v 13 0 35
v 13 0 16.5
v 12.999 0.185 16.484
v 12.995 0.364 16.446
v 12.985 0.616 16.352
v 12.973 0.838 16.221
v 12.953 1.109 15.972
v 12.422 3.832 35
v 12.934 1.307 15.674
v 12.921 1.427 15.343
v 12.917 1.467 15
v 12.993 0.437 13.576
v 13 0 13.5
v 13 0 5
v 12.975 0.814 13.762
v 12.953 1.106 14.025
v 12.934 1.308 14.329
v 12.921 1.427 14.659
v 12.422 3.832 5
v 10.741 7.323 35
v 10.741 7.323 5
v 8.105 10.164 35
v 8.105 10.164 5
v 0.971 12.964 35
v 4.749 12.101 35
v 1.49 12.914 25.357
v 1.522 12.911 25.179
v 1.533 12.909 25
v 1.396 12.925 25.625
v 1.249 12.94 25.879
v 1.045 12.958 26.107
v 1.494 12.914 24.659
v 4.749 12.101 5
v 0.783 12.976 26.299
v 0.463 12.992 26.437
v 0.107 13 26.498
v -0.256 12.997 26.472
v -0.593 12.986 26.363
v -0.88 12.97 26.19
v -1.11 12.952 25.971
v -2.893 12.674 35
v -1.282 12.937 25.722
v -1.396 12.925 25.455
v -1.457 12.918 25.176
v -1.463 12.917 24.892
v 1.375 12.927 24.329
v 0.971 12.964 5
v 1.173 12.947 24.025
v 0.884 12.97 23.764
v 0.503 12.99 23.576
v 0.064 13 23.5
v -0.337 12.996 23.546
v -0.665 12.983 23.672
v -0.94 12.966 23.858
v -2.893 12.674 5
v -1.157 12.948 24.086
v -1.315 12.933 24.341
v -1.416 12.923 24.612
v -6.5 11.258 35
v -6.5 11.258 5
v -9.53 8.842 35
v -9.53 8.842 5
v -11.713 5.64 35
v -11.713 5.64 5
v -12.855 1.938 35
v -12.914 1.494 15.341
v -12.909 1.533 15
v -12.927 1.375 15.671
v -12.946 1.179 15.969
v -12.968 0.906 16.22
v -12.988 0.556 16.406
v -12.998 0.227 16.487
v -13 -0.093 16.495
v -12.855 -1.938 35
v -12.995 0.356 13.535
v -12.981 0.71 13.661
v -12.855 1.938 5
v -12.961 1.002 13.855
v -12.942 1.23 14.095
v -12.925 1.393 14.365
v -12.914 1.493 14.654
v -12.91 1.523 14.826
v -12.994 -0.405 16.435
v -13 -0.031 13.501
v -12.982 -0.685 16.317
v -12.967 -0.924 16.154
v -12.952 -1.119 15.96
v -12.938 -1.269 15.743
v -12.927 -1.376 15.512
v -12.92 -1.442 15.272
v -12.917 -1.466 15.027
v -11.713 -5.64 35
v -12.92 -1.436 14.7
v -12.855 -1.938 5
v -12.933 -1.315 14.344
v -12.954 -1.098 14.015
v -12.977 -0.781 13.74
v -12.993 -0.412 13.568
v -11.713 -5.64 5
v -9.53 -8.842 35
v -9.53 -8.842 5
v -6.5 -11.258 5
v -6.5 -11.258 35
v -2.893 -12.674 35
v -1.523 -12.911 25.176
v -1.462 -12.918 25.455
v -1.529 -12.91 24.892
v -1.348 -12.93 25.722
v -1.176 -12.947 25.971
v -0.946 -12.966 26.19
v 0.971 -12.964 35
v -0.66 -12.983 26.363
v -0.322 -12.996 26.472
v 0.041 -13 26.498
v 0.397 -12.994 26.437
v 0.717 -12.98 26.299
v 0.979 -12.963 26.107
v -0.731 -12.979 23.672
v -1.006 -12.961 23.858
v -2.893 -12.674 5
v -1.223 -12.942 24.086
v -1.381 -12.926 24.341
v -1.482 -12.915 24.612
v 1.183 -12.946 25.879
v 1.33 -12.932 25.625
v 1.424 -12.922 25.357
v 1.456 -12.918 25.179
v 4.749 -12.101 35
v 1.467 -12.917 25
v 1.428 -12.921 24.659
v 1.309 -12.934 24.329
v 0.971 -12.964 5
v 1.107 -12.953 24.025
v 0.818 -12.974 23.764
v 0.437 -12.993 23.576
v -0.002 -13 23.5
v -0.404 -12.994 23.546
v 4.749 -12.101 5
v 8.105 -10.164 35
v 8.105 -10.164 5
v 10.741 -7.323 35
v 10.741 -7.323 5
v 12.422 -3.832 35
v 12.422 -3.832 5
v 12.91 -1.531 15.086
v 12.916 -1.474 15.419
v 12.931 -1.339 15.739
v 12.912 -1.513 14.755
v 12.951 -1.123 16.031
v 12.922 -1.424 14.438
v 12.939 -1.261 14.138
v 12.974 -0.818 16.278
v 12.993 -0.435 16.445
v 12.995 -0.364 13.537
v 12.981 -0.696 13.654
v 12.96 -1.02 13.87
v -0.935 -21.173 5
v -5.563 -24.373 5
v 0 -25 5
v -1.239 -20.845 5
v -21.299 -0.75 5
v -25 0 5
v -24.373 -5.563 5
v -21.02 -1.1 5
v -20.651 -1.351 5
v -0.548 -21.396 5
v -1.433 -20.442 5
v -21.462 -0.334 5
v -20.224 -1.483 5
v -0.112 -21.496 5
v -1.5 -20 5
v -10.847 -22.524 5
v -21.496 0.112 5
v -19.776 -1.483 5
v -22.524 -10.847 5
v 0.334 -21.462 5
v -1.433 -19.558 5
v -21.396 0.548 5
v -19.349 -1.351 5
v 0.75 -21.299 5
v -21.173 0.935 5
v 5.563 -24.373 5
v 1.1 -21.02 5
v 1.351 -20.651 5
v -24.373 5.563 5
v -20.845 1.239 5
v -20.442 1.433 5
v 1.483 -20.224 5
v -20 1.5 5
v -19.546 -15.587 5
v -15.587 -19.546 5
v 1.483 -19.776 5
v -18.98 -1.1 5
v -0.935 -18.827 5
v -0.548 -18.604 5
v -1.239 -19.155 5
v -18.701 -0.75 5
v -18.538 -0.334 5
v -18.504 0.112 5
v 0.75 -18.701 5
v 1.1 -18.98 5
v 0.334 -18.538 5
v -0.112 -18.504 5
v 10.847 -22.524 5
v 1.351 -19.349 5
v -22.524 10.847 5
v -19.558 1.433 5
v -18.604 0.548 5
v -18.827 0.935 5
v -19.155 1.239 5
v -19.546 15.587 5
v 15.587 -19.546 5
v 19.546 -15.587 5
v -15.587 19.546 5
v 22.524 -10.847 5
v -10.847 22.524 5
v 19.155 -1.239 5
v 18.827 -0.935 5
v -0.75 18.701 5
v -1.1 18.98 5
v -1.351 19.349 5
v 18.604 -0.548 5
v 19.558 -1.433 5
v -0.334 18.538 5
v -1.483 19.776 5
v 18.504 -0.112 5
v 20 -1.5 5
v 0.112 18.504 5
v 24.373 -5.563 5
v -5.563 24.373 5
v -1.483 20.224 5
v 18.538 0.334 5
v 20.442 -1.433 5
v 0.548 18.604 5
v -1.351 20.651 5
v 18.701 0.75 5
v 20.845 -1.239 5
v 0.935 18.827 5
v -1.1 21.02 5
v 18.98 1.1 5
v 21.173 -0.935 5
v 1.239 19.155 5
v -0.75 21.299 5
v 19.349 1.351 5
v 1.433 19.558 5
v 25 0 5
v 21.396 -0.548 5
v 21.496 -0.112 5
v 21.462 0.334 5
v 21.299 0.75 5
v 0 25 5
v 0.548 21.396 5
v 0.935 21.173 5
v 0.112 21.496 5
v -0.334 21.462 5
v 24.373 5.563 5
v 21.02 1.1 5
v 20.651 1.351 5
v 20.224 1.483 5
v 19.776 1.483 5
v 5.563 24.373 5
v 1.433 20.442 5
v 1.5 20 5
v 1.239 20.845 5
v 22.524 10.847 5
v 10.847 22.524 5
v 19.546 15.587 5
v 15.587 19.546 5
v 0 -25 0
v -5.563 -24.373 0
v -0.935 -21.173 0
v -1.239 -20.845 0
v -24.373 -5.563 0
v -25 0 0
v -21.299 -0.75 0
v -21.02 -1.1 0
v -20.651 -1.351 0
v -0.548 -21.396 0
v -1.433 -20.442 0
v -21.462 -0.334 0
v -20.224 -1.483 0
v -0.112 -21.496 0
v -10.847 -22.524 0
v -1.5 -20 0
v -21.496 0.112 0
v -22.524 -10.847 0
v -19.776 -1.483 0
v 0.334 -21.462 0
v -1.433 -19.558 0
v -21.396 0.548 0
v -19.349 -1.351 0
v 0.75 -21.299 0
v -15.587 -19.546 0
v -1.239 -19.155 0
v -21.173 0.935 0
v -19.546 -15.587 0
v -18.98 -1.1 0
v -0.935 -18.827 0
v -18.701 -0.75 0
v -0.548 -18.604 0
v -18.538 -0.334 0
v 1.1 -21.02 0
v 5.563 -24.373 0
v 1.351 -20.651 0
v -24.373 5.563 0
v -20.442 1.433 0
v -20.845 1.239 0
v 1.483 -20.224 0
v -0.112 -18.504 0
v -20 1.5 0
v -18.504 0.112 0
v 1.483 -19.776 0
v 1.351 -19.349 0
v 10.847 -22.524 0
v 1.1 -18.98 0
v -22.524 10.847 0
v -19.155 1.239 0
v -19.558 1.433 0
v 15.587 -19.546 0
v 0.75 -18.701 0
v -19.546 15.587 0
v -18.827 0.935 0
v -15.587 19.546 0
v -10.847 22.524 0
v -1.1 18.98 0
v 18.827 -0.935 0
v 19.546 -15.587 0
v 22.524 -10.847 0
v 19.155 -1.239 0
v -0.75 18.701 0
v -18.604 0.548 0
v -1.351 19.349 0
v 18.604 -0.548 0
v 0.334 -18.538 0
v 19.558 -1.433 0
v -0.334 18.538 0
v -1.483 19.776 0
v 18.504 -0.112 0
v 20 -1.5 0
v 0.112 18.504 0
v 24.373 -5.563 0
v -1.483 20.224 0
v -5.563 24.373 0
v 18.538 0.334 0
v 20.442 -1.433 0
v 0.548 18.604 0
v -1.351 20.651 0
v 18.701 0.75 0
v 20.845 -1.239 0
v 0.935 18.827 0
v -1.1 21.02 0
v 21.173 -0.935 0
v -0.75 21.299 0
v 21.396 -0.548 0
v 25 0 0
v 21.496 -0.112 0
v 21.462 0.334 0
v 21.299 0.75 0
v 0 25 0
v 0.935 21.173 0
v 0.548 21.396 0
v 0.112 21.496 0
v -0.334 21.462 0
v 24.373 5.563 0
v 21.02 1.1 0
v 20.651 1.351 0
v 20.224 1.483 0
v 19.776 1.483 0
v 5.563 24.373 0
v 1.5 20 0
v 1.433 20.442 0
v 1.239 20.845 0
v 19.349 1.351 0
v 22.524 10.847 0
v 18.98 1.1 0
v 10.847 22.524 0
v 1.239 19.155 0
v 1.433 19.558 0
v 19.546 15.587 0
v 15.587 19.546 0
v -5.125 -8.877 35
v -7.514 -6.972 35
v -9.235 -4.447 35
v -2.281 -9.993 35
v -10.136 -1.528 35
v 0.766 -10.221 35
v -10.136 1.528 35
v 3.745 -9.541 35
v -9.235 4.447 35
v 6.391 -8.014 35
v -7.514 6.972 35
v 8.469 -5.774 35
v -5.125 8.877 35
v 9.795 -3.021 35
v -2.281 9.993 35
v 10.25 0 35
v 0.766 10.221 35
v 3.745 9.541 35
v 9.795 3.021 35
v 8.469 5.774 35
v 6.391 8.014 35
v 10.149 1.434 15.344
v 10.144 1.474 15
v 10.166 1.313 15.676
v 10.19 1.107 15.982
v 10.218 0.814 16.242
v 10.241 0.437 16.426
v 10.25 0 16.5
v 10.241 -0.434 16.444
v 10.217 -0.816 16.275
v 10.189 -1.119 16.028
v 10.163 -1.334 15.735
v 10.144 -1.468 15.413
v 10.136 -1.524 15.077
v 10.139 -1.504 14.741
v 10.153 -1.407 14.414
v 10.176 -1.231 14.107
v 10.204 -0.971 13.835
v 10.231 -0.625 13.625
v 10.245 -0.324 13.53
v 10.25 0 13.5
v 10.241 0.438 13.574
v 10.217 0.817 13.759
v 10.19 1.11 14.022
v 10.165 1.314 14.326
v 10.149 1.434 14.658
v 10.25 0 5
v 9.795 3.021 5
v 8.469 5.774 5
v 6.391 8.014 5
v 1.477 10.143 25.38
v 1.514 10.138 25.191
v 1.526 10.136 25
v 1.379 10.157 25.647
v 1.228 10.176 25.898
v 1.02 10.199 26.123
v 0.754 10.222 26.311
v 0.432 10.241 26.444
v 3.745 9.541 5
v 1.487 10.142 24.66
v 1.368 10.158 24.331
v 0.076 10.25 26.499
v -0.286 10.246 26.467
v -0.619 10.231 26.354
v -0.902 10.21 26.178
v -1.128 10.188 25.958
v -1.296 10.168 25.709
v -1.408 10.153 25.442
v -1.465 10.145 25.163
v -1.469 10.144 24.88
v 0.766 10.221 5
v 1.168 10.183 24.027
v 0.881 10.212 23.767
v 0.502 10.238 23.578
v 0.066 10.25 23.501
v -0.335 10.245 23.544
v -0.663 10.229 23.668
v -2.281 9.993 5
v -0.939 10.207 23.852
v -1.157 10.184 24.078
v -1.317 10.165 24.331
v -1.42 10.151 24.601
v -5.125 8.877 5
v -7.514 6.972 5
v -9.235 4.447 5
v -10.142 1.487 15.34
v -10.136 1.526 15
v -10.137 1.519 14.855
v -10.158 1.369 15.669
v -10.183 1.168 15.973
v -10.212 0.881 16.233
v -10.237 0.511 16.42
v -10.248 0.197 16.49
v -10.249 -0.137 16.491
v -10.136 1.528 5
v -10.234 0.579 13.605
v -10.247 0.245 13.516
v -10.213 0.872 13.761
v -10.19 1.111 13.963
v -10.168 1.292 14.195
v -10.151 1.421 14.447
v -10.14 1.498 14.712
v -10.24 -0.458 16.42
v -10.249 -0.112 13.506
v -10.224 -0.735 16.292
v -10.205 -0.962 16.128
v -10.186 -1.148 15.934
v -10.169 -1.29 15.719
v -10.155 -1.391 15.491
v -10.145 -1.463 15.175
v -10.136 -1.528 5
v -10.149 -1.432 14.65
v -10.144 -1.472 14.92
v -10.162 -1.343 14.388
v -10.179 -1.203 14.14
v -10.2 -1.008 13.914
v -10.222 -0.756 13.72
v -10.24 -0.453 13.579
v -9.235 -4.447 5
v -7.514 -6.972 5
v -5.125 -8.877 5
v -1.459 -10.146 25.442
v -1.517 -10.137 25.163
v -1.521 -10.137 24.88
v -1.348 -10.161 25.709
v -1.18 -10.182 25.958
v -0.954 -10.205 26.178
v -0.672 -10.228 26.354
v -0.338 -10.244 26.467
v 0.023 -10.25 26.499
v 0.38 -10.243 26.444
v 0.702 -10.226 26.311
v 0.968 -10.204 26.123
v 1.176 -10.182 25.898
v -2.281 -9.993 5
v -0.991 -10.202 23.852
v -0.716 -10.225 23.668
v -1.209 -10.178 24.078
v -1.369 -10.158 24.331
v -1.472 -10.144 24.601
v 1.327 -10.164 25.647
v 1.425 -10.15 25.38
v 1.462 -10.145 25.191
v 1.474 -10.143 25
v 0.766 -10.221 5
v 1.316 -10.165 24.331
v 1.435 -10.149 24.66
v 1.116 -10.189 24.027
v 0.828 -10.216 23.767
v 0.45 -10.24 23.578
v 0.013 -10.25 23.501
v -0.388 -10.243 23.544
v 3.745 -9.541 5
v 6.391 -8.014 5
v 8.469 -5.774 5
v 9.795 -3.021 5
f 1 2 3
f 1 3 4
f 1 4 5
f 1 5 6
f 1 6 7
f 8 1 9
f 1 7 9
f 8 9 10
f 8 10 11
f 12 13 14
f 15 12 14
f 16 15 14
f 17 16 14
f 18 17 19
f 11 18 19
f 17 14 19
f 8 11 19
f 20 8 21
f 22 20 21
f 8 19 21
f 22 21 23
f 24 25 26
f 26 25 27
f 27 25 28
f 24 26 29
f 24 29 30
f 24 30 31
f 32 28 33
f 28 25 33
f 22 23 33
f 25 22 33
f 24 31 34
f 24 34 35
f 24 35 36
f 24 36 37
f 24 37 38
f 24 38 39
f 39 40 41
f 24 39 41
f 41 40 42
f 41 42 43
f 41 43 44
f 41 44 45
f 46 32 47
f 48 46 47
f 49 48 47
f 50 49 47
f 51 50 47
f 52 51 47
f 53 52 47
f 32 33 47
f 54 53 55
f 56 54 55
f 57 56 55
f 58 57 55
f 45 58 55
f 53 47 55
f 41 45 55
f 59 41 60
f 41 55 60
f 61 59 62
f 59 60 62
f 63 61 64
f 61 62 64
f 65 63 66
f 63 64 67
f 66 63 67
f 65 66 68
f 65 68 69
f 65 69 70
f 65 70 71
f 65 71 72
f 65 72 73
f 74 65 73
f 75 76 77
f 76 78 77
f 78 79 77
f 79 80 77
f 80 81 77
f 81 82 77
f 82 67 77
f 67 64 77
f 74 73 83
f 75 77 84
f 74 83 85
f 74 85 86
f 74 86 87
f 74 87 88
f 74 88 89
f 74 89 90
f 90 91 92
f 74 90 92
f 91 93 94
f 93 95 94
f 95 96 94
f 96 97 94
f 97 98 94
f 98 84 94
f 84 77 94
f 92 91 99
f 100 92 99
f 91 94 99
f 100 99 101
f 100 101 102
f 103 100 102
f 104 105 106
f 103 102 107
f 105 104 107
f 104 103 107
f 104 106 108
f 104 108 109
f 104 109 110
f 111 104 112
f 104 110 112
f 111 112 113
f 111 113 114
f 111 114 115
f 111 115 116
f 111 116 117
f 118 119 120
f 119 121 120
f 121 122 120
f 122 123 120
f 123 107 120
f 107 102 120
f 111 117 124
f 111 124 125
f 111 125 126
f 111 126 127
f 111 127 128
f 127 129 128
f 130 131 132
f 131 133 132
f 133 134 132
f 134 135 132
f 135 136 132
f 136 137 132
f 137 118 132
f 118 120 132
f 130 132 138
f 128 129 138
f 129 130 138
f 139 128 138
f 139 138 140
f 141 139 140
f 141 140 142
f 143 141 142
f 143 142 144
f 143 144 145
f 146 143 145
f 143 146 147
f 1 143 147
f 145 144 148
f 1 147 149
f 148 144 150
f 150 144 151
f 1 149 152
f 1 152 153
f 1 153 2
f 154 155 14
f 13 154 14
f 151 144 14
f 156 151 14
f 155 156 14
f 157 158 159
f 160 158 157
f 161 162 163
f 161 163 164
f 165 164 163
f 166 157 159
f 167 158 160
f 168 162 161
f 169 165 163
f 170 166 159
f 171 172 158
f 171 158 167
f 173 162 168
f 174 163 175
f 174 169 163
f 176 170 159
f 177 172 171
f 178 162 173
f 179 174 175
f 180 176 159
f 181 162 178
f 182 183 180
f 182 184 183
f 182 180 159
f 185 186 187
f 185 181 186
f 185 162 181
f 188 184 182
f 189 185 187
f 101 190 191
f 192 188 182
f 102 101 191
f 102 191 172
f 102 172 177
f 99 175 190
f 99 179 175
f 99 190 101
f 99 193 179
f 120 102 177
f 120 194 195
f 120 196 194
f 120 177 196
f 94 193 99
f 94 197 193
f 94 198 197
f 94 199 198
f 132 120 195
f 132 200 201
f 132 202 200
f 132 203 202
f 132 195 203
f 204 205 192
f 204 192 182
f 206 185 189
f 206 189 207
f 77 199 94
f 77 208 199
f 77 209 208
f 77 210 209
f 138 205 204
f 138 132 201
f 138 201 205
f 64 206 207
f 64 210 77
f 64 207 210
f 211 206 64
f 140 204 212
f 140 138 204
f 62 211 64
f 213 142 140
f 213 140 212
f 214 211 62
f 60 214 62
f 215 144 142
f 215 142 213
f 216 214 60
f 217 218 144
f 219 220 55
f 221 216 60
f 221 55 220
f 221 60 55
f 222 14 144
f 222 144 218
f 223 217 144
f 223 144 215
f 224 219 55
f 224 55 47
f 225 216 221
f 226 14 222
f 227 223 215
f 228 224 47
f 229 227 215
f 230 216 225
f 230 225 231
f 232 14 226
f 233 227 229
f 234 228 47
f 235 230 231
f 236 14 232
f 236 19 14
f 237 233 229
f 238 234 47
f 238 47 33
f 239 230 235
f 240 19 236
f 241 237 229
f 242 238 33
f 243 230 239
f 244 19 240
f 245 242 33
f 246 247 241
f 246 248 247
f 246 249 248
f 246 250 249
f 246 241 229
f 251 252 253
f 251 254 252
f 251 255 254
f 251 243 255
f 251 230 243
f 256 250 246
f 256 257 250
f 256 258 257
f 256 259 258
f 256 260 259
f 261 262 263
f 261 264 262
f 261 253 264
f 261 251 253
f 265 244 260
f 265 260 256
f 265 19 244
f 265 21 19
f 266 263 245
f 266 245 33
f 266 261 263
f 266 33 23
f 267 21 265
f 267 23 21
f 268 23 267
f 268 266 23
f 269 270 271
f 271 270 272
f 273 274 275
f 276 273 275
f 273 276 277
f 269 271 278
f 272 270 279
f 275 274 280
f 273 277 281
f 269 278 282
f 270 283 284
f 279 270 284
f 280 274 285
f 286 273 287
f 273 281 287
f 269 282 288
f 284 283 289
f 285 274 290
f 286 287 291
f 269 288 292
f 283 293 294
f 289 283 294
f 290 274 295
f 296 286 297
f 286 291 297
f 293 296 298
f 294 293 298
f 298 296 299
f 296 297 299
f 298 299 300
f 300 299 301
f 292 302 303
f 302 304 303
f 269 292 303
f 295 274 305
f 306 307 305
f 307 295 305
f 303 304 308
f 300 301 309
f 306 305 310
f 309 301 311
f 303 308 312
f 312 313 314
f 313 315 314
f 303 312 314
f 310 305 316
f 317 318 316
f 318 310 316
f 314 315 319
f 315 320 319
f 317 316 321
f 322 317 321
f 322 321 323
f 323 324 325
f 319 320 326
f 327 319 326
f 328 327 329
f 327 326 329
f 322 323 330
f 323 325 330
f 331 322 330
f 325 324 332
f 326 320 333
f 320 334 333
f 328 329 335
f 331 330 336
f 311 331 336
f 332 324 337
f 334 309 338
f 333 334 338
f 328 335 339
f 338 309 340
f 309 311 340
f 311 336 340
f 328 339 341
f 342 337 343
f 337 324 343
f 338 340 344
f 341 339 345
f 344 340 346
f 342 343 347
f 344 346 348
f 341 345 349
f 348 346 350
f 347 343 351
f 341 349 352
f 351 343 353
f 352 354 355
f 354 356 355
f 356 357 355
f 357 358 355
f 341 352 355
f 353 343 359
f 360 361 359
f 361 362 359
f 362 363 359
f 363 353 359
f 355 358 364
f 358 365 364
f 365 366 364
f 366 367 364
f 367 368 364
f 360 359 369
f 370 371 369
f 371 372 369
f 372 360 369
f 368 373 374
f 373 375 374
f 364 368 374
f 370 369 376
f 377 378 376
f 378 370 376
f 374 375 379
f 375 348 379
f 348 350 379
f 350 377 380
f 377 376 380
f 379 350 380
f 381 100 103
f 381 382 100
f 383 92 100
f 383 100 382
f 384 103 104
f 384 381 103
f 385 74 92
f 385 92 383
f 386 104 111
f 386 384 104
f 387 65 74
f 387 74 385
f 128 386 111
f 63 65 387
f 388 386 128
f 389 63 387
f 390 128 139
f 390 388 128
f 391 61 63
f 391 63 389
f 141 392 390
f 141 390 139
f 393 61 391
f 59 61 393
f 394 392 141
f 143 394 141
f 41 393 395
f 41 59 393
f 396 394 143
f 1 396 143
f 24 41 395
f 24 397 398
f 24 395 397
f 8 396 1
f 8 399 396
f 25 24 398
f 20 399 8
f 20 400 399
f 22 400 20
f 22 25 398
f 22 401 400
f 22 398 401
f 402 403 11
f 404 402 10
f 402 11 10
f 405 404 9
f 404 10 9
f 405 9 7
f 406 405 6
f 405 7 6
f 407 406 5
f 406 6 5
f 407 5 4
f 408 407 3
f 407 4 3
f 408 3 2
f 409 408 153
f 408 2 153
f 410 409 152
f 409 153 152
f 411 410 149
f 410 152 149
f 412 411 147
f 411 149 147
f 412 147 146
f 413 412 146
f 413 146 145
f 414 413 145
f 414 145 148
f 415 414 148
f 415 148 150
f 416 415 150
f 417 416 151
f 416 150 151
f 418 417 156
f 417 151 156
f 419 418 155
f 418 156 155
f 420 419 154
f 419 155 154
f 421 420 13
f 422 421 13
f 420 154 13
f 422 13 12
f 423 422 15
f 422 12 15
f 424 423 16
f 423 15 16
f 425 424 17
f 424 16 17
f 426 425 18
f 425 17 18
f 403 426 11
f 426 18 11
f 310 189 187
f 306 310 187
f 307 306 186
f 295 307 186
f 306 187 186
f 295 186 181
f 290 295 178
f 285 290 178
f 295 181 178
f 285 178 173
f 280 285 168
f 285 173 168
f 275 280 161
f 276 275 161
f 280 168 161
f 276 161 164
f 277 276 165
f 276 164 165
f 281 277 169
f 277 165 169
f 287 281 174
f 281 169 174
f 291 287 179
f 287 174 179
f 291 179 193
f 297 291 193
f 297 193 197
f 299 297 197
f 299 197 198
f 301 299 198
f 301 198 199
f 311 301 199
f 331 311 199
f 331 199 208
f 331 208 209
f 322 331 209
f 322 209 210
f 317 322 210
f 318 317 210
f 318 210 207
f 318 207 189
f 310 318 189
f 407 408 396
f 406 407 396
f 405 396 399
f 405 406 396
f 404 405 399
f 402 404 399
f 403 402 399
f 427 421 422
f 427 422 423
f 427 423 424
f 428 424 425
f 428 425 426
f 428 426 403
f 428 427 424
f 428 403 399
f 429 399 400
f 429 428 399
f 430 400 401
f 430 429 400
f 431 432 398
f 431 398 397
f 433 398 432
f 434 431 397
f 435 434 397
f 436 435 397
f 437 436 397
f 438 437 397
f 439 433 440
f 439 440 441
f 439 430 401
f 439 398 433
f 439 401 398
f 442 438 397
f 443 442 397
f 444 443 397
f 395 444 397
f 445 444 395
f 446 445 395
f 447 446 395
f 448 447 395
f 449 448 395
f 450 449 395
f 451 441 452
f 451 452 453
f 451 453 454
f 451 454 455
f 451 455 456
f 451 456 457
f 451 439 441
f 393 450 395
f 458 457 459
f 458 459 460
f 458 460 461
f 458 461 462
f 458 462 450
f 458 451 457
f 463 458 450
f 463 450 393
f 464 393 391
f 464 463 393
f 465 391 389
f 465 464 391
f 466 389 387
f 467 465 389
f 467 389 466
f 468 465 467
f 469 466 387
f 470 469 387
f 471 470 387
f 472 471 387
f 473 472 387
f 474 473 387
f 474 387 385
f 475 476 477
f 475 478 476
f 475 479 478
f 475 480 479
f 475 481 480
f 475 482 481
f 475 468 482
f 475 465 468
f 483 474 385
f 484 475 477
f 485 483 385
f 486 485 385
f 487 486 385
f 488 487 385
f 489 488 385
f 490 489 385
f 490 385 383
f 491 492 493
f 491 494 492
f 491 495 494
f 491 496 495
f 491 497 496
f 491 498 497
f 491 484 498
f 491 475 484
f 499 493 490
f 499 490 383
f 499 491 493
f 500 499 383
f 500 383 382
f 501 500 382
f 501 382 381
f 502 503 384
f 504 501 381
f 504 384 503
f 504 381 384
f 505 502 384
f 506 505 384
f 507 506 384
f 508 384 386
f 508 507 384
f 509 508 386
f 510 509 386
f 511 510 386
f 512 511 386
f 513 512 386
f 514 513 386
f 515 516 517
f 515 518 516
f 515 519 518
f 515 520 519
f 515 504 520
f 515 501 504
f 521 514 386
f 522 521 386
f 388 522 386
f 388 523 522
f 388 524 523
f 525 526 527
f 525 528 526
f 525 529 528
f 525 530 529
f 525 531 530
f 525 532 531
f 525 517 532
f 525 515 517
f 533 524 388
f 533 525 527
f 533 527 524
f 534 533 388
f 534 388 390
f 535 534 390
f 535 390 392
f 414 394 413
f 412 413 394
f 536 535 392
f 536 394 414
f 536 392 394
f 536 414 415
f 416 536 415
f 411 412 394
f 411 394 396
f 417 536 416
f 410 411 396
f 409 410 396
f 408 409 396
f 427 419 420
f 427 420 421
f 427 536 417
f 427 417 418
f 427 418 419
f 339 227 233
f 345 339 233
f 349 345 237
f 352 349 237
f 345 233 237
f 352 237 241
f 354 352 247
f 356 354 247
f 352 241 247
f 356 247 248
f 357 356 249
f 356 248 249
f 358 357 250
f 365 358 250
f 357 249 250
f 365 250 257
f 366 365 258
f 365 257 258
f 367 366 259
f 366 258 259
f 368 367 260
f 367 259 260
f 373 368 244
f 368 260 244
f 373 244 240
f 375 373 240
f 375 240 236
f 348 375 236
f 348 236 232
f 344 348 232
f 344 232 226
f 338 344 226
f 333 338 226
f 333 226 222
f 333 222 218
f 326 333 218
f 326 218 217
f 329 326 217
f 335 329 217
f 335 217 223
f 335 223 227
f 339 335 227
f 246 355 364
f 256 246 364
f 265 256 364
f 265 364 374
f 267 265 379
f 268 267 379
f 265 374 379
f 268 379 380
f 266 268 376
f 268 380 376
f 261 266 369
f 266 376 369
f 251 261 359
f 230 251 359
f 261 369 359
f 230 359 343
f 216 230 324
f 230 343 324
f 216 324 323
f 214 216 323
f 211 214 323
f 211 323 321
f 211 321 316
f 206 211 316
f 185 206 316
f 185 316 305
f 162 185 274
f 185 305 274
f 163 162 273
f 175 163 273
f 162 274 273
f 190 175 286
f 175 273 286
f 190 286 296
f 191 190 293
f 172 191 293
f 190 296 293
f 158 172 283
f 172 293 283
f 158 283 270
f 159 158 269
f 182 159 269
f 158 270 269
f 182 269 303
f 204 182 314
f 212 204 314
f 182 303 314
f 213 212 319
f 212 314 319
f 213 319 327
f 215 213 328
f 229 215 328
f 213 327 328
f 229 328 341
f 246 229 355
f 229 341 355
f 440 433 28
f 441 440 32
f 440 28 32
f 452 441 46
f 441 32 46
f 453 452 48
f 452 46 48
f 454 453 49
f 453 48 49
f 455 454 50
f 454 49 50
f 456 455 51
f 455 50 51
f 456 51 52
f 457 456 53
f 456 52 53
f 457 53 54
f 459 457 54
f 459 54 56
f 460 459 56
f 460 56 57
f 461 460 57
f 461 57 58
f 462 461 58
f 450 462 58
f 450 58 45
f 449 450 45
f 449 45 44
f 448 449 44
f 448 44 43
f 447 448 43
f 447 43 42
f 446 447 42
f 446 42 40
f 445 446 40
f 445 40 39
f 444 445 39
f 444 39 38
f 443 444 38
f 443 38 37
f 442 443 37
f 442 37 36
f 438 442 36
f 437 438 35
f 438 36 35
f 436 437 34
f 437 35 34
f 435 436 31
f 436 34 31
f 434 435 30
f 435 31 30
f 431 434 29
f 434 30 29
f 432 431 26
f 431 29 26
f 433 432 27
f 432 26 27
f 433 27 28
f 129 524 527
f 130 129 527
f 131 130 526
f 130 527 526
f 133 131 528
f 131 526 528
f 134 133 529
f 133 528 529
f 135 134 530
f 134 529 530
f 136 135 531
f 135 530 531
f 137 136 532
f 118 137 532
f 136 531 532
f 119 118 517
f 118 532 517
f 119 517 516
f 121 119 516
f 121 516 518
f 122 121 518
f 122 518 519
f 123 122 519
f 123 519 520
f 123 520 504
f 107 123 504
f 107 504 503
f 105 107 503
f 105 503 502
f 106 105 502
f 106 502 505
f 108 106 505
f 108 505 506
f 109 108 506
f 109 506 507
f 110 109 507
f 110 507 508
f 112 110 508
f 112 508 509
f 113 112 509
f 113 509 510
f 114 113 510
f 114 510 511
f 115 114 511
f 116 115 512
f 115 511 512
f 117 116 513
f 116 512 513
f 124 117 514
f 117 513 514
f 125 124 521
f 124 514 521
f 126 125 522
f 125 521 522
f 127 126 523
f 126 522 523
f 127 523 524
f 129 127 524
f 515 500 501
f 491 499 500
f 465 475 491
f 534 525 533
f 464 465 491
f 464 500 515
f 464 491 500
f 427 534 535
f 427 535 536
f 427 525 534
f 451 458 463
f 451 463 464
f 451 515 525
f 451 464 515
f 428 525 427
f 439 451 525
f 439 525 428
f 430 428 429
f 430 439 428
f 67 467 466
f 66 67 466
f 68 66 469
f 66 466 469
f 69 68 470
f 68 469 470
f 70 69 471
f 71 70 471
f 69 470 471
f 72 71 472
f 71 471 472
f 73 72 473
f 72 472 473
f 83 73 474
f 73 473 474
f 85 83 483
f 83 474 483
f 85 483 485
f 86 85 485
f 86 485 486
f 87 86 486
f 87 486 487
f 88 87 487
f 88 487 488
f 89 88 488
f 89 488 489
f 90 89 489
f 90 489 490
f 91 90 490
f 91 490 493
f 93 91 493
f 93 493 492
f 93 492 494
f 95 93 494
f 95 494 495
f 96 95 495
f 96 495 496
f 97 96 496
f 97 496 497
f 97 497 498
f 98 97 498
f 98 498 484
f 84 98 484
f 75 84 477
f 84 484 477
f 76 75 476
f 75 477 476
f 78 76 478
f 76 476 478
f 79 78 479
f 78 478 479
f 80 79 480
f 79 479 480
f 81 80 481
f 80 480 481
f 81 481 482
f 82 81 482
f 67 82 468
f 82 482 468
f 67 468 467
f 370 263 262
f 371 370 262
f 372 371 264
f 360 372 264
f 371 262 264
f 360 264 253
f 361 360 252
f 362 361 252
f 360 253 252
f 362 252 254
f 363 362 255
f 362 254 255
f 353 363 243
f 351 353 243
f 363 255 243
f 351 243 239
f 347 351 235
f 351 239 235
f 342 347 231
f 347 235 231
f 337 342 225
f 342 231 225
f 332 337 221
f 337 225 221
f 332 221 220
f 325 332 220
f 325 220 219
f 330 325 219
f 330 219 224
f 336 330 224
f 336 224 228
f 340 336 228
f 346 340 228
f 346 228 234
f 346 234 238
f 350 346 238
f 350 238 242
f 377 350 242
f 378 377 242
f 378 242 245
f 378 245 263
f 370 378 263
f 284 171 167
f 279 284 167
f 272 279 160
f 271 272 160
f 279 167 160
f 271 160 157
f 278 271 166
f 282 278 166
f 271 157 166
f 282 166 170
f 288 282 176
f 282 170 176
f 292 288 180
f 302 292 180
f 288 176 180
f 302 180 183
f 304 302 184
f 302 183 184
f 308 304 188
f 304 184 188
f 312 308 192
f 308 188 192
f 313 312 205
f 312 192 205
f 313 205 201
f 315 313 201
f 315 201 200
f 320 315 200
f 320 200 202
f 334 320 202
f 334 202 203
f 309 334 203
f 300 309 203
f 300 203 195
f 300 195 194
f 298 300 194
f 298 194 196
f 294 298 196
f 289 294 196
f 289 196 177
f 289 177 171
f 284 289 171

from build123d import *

# Parameters (mm, degrees)
ESQUISSE1_R                             = 25
BOSS_EXTRU_1_DEPTH                      = 5
ESQUISSE2_R                             = 13
ESQUISSE2_R_2                           = 10.25
BOSS_EXTRU_2_DEPTH                      = 30
ESQUISSE3_R                             = 1.5
ENL_V_MAT_EXTRU_1_DEPTH                 = 47.368092477
R_P_TITION_CIRCULAIRE1_COUNT            = 4
DIAM_TRE_DU_PER_AGE_3_0_3_1_D           = 3
DIAM_TRE_DU_PER_AGE_3_0_3_1_ON_FACE_2_D = 3


with BuildPart() as part:
    # Esquisse1 → Boss.-Extru.1 (new body)
    with BuildSketch(Plane.XY):
        Circle(ESQUISSE1_R)
    extrude(amount=BOSS_EXTRU_1_DEPTH)

    # Esquisse2 → Boss.-Extru.2 (add)
    with BuildSketch(Plane.XY.offset(5)):
        Circle(ESQUISSE2_R)
        Circle(ESQUISSE2_R_2, mode=Mode.SUBTRACT)
    extrude(amount=BOSS_EXTRU_2_DEPTH)

    # Esquisse3 → Enlèv. mat.-Extru.1 (cut, through all)
    with BuildSketch(Plane.XY.offset(5)):
        with Locations((0, 20)):
            Circle(ESQUISSE3_R)
    enl_v_mat_extru_1 = extrude(amount=-ENL_V_MAT_EXTRU_1_DEPTH, mode=Mode.SUBTRACT)

    # Répétition circulaire1: Enlèv. mat.-Extru.1 ×4 about axis
    r_p_tition_circulaire1_axis = Axis((0, 0, 0), (0, 0, 1))
    for i in range(1, R_P_TITION_CIRCULAIRE1_COUNT):
        add(enl_v_mat_extru_1.rotate(r_p_tition_circulaire1_axis, i * 360 / R_P_TITION_CIRCULAIRE1_COUNT), mode=Mode.SUBTRACT)

    # Diamètre du perçage Ø3.0 (3)1 (through all)
    with Locations(Plane(origin=(-0.03314831, -12.999957738, 25), x_dir=(-0.999996749076, 0.002549870024, 0), z_dir=(-0.002549870024, -0.999996749076, 0))):
        with Locations((0, 0)):
            Hole(DIAM_TRE_DU_PER_AGE_3_0_3_1_D / 2)

    # Diamètre du perçage Ø3.0 (3)1 on face 2 (through all)
    with Locations(Plane(origin=(-12.999956307, 0.03370475, 15), x_dir=(-0.002592999062, -0.999996638172, 0), z_dir=(-0.999996638172, 0.002592999062, 0))):
        with Locations((0, 0)):
            Hole(DIAM_TRE_DU_PER_AGE_3_0_3_1_ON_FACE_2_D / 2)


solid = part.part
